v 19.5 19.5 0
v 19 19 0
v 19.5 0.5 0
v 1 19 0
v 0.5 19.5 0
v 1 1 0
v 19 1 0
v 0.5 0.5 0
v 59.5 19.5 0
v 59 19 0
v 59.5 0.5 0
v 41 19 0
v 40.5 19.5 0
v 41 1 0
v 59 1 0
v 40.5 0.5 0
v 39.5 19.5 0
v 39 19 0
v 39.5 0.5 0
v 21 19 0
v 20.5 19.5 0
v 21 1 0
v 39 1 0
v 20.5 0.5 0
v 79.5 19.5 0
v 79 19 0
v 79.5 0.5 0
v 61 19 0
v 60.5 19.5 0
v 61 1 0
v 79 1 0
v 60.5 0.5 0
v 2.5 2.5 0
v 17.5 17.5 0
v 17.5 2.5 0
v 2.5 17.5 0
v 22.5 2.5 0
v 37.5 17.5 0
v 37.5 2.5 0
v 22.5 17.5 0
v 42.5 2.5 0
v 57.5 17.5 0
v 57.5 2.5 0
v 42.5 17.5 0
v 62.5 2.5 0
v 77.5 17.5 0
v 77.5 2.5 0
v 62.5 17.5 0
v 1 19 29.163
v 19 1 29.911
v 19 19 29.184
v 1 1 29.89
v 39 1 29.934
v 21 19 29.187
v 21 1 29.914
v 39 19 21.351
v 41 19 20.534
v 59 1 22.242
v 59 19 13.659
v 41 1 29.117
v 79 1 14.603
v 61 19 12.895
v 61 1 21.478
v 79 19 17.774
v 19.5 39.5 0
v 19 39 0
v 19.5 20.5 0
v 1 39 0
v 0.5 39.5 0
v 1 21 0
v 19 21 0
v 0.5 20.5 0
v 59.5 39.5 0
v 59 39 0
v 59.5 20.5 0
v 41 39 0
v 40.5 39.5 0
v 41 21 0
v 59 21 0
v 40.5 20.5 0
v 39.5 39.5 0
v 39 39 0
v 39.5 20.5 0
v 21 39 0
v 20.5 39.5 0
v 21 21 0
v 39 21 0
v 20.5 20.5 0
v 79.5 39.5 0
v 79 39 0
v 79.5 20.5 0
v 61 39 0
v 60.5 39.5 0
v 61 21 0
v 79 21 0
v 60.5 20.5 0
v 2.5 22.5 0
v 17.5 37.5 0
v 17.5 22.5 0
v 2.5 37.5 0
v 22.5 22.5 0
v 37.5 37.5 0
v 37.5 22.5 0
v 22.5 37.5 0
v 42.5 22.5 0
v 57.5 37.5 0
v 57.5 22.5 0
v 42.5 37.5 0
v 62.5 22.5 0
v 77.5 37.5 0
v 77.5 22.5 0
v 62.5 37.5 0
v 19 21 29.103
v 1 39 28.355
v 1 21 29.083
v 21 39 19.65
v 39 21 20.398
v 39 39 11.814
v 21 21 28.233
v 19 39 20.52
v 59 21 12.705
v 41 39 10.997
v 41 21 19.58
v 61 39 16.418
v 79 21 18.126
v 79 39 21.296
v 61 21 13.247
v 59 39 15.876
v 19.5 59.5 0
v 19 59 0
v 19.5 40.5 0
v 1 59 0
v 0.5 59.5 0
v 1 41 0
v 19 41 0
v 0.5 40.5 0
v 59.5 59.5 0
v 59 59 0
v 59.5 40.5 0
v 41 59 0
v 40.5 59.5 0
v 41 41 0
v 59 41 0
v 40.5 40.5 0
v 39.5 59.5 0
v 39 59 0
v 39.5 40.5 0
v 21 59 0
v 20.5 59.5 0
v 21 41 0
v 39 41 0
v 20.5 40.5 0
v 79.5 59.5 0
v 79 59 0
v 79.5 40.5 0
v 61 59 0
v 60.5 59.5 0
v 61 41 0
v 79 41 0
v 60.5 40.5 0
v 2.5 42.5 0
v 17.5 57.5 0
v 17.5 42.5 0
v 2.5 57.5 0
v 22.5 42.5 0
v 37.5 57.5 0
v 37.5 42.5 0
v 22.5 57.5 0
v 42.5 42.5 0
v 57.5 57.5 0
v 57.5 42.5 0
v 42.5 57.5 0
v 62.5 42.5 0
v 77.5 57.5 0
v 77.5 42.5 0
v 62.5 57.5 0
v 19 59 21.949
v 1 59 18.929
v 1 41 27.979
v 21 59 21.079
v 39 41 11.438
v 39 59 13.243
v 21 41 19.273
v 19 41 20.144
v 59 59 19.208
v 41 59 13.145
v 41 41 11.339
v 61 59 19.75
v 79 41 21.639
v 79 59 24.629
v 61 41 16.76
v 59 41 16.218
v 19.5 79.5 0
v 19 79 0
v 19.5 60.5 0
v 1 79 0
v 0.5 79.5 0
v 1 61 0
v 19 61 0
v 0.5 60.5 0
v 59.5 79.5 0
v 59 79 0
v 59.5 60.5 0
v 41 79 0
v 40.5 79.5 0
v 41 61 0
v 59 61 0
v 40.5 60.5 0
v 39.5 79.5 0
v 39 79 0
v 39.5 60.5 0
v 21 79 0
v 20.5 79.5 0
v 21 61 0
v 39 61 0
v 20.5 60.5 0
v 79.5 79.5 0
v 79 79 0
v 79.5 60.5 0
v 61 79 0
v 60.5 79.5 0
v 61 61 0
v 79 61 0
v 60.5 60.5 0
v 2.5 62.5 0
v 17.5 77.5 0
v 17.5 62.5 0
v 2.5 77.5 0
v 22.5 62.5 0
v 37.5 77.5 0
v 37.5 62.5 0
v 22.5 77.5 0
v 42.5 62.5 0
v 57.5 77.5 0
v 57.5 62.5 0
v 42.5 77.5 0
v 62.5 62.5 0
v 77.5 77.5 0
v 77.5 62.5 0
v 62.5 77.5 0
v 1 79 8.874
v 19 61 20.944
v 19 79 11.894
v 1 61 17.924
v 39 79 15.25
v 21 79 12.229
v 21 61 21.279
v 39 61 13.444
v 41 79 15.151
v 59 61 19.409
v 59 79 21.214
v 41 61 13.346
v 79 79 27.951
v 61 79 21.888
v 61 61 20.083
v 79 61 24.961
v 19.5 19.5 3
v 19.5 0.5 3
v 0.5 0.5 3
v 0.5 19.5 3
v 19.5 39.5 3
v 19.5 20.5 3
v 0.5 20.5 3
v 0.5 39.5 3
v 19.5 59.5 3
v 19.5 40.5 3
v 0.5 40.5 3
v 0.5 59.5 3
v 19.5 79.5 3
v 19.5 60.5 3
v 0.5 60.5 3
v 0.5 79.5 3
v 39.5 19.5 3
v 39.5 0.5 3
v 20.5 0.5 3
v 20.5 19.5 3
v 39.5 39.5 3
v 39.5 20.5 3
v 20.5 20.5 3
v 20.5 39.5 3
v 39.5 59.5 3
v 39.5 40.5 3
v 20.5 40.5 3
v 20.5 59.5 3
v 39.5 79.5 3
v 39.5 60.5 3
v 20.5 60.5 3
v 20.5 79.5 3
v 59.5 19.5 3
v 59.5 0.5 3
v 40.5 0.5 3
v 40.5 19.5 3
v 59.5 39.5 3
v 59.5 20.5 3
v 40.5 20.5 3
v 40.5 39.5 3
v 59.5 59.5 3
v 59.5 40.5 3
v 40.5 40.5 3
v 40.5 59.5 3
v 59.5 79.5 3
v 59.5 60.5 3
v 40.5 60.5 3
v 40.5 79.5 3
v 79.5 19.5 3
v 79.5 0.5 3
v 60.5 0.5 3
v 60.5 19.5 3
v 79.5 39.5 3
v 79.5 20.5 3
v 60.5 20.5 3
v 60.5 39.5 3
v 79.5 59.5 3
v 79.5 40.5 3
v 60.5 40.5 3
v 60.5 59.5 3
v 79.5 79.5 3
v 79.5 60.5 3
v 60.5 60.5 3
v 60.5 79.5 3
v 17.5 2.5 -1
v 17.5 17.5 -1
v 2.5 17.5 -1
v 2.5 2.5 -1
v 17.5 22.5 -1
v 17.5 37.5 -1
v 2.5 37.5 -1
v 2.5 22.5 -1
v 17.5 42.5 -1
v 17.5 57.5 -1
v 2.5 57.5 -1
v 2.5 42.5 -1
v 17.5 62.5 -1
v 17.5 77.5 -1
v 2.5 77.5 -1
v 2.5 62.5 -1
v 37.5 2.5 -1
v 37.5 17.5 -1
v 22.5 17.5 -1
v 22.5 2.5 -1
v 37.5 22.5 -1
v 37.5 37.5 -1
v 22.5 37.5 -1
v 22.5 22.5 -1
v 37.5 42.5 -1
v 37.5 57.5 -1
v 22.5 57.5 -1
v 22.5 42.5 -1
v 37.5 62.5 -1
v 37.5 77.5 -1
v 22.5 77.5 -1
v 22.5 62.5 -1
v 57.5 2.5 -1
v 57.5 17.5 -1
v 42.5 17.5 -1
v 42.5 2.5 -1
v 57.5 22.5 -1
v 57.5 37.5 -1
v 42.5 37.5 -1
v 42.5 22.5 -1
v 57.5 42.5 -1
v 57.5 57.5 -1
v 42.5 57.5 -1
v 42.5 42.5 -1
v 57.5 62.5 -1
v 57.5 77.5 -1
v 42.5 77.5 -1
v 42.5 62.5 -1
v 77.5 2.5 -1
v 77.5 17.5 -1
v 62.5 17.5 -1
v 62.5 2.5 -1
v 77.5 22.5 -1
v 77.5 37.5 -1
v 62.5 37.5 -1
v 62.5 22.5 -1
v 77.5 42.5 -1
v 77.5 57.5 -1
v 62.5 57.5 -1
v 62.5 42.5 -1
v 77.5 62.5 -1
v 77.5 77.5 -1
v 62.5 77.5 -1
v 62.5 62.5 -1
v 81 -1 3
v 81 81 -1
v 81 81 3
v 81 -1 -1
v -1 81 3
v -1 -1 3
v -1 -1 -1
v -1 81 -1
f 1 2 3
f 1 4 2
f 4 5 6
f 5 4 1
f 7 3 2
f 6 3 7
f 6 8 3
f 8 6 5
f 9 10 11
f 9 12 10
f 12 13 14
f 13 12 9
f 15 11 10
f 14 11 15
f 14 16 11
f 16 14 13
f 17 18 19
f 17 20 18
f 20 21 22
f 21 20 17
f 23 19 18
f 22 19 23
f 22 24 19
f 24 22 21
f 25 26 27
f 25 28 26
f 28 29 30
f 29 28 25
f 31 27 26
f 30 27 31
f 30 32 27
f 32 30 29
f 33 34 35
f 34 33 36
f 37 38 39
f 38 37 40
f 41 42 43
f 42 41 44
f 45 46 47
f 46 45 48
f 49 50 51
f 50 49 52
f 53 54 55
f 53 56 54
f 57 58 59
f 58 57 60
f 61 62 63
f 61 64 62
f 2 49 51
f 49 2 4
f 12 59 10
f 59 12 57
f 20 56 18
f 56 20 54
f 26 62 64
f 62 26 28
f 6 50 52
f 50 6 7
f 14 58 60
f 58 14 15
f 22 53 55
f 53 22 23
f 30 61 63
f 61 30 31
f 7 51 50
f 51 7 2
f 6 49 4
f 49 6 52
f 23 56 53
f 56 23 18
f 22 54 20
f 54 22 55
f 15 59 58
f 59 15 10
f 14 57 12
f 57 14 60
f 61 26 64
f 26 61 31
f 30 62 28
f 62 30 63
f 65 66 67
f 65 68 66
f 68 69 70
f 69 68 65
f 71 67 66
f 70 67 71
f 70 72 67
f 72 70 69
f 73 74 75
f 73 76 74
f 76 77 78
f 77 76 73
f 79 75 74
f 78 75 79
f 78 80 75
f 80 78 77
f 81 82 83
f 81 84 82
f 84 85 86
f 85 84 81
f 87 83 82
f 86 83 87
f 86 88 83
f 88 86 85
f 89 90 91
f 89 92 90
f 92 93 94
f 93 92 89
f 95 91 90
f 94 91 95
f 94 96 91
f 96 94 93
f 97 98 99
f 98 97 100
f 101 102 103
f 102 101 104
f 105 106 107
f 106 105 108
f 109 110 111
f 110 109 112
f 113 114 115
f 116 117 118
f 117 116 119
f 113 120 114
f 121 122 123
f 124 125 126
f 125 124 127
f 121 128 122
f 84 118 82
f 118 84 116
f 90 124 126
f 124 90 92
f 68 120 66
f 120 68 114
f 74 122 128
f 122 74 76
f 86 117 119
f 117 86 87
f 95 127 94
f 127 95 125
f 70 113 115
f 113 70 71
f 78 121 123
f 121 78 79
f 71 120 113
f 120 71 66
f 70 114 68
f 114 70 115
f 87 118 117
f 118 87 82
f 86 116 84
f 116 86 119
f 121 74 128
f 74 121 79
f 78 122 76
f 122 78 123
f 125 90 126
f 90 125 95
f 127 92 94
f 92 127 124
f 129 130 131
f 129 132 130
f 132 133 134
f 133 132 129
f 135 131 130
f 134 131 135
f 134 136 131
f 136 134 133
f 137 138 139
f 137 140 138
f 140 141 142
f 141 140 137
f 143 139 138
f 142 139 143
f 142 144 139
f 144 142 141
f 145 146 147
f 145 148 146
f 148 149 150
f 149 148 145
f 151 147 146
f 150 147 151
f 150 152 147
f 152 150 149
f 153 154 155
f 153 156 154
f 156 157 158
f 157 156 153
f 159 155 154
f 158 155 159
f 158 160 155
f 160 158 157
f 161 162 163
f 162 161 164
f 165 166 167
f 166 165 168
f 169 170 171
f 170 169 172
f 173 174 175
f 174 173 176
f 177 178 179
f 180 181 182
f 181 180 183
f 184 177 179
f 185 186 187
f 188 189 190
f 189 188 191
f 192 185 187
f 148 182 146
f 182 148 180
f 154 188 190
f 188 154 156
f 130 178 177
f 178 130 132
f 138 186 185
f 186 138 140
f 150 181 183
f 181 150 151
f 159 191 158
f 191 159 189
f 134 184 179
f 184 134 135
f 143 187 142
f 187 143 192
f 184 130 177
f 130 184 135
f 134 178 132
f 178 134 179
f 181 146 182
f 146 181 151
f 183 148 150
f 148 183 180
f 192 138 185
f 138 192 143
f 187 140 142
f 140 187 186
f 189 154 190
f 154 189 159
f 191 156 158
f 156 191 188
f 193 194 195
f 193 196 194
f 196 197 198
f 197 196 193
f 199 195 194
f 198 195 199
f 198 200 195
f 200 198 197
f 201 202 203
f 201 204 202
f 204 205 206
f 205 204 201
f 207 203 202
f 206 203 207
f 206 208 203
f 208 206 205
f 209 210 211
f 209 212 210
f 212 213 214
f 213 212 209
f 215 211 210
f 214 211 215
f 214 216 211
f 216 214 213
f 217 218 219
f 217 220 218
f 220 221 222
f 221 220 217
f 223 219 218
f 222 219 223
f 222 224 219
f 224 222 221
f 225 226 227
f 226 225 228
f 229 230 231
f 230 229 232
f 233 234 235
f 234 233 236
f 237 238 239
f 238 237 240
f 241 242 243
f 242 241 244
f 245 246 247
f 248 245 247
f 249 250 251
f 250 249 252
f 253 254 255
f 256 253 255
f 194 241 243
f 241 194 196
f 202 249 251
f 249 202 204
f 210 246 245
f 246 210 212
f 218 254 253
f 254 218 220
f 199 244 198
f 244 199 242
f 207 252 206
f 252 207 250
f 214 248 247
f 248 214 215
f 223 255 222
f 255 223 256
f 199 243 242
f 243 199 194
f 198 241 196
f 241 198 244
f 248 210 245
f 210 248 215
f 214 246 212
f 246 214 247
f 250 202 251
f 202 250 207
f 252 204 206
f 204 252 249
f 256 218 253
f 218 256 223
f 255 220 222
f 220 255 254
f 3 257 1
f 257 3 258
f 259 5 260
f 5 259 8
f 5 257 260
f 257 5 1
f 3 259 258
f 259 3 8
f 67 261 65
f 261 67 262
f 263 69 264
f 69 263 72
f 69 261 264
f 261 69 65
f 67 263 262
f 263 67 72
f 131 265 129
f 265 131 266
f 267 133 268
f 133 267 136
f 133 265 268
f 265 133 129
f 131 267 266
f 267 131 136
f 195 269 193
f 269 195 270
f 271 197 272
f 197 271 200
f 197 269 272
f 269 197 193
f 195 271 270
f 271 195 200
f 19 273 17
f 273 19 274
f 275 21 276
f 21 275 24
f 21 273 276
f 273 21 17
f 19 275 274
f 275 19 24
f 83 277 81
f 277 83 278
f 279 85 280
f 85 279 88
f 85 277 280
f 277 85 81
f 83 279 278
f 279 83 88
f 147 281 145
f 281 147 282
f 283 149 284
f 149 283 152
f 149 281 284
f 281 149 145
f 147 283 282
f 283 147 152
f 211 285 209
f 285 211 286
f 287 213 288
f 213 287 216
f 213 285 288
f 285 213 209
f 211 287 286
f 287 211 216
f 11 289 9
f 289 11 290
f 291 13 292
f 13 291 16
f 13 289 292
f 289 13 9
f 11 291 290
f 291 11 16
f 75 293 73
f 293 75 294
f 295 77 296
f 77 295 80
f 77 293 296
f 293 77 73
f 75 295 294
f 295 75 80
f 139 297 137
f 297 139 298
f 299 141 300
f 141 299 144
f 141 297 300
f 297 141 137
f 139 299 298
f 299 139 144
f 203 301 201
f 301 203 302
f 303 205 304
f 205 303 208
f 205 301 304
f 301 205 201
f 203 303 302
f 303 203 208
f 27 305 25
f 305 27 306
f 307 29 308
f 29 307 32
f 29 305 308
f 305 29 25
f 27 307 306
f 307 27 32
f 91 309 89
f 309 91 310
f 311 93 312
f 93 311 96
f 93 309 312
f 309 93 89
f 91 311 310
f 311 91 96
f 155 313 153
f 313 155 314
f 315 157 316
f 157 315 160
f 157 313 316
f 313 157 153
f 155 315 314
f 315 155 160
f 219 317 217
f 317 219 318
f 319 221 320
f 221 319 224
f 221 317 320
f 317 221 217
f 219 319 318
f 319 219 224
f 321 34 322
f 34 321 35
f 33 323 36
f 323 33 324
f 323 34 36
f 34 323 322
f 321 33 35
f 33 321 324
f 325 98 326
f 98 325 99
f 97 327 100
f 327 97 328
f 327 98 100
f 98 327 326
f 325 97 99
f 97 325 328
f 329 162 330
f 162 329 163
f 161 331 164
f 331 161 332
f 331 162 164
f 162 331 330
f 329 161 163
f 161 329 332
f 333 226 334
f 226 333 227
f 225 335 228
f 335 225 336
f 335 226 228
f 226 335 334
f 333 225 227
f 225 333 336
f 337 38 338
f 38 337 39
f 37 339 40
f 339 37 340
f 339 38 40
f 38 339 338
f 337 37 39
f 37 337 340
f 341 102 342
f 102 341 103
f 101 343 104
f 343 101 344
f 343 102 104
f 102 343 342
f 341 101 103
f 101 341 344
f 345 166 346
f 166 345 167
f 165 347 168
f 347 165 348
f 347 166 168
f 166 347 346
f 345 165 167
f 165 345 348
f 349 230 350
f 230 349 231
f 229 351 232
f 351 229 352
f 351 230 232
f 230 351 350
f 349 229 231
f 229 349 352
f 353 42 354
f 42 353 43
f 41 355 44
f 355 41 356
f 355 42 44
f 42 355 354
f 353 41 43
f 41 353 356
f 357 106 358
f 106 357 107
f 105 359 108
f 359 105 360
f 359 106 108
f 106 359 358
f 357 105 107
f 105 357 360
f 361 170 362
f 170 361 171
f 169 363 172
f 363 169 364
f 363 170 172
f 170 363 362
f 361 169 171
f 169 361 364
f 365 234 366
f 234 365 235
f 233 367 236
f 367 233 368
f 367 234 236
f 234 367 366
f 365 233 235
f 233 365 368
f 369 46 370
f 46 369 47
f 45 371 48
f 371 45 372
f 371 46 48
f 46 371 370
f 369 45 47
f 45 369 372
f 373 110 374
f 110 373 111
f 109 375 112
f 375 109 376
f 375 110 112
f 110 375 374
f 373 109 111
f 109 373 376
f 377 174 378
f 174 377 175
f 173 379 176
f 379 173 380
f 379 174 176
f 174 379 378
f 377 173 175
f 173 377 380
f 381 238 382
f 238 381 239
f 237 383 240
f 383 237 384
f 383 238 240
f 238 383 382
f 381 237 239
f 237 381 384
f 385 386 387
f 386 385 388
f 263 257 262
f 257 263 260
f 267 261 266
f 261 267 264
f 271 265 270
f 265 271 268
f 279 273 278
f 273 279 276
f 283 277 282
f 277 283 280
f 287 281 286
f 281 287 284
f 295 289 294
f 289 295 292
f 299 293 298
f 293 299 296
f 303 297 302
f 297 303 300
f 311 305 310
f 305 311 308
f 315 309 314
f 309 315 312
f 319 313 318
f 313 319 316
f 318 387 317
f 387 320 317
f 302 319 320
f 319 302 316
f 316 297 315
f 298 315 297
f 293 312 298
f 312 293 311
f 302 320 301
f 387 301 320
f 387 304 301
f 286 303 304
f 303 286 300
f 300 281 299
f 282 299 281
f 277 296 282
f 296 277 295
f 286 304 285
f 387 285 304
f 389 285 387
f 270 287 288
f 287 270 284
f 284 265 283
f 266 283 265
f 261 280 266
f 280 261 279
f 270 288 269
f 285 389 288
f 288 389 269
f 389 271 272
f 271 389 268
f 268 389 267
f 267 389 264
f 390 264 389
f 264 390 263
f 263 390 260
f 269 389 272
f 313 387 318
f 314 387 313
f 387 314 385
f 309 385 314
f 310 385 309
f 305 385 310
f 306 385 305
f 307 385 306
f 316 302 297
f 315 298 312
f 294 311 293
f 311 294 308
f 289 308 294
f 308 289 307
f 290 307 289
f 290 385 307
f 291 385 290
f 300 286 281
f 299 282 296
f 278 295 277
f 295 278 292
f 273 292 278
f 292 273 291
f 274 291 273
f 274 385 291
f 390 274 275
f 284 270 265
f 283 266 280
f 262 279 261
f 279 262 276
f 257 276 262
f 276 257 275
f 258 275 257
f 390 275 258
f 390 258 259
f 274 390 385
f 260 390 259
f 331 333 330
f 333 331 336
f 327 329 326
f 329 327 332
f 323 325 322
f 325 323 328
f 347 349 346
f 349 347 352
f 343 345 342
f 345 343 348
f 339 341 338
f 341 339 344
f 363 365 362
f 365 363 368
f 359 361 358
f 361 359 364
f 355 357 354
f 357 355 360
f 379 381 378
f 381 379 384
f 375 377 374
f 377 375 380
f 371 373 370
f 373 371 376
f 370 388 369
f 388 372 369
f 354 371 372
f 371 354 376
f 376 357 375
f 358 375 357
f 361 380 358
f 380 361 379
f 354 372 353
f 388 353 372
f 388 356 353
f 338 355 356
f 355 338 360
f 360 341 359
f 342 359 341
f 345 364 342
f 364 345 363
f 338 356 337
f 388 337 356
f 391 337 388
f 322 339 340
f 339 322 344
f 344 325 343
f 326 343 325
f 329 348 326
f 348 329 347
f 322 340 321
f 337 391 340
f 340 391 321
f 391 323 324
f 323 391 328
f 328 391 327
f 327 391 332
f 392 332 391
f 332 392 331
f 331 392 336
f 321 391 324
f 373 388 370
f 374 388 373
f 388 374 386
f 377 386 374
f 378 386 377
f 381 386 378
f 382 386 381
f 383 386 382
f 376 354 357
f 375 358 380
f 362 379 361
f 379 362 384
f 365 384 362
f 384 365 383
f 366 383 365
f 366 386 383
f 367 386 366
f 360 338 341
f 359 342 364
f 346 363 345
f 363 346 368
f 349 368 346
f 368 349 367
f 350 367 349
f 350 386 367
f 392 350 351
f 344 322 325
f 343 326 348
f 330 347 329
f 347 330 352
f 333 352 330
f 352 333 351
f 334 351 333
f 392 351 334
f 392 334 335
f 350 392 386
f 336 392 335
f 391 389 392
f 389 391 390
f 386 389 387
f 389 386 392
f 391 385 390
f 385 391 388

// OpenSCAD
//make sure each stone is quite unique
randomizer_seed=1;
cube_size=20;

// Which one would you like to see?
part = "both"; // [first:Puzzle Only,second:Board Only,both:Puzzle and Board]


/* [Hidden] */
d=1;
ran=rands(cube_size/4,1.5*cube_size,9,randomizer_seed);



module a(){
polyhedron(
  points=[ [0,0,0],[0,4*cube_size,0],[4*cube_size,4*cube_size,0],[4*cube_size,0,0],[0,0,ran[0]],[0,2*cube_size,ran[1]],[0,4*cube_size,ran[2]],[2*cube_size,0,ran[3]],[2*cube_size,2*cube_size,ran[4]],[2*cube_size,4*cube_size,ran[5]],[4*cube_size,0,ran[6]],[4*cube_size,2*cube_size,ran[7]],[4*cube_size,4*cube_size,ran[8]] ],                                 
  faces=[ [2,1,0],[2,0,3],[0,5,4],[1,6,5],[1,5,0],[0,4,7],[7,10,3],[0,7,3],[3,10,11],[11,12,2],[3,11,2],[2,12,9],[9,6,1],[2,9,1],[4,5,7],[5,8,7],[7,8,10],[8,11,10],[5,6,9],[5,9,8],[8,9,12],[8,12,11] ]                        
 );
}


module r(n){
difference(){
a();
translate([-10,cube_size*n+cube_size-d,-1])
cube([6*cube_size,4*cube_size,2*cube_size]);
translate([-cube_size,-4*cube_size+d+cube_size*n,-1])
cube([6*cube_size,4*cube_size,2*cube_size]);
}
}


module p(n,m){
union(){
difference(){
r(n);
translate([cube_size*m+cube_size-d,-cube_size,-1])
cube([4*cube_size,6*cube_size,2*cube_size]);
translate([-4*cube_size+d+cube_size*m,-cube_size,-1])
cube([4*cube_size,6*cube_size,2*cube_size]);
}

}
}

module stones(){
for(i=[0,1,2,3]){
for(j=[0,1,2,3]){
p(i,j);
}
}
}

module board(){
difference(){
translate([-1,-1,-1])
cube([4*cube_size+2,4*cube_size+2,4]);
for(i=[0,1,2,3]){
for(j=[0,1,2,3]){
translate([d/2+cube_size*i,d/2+cube_size*j,0])
cube([cube_size-d,cube_size-d,8]);
}
}
for(i=[0,1,2,3]){
for(j=[0,1,2,3]){
translate([(cube_size/8)+cube_size*i,(cube_size/8)+cube_size*j,-5])
cube([3*cube_size/4,3*cube_size/4,10]);
}
}
}
}

print_part();

module print_part() {
	if (part == "first") {
		stones();
	} else if (part == "second") {
        translate([0,0,1])
		board();
	} else if (part == "both") {
		stones();
        board();

	} else {
		stones();
        board();

	}
}




